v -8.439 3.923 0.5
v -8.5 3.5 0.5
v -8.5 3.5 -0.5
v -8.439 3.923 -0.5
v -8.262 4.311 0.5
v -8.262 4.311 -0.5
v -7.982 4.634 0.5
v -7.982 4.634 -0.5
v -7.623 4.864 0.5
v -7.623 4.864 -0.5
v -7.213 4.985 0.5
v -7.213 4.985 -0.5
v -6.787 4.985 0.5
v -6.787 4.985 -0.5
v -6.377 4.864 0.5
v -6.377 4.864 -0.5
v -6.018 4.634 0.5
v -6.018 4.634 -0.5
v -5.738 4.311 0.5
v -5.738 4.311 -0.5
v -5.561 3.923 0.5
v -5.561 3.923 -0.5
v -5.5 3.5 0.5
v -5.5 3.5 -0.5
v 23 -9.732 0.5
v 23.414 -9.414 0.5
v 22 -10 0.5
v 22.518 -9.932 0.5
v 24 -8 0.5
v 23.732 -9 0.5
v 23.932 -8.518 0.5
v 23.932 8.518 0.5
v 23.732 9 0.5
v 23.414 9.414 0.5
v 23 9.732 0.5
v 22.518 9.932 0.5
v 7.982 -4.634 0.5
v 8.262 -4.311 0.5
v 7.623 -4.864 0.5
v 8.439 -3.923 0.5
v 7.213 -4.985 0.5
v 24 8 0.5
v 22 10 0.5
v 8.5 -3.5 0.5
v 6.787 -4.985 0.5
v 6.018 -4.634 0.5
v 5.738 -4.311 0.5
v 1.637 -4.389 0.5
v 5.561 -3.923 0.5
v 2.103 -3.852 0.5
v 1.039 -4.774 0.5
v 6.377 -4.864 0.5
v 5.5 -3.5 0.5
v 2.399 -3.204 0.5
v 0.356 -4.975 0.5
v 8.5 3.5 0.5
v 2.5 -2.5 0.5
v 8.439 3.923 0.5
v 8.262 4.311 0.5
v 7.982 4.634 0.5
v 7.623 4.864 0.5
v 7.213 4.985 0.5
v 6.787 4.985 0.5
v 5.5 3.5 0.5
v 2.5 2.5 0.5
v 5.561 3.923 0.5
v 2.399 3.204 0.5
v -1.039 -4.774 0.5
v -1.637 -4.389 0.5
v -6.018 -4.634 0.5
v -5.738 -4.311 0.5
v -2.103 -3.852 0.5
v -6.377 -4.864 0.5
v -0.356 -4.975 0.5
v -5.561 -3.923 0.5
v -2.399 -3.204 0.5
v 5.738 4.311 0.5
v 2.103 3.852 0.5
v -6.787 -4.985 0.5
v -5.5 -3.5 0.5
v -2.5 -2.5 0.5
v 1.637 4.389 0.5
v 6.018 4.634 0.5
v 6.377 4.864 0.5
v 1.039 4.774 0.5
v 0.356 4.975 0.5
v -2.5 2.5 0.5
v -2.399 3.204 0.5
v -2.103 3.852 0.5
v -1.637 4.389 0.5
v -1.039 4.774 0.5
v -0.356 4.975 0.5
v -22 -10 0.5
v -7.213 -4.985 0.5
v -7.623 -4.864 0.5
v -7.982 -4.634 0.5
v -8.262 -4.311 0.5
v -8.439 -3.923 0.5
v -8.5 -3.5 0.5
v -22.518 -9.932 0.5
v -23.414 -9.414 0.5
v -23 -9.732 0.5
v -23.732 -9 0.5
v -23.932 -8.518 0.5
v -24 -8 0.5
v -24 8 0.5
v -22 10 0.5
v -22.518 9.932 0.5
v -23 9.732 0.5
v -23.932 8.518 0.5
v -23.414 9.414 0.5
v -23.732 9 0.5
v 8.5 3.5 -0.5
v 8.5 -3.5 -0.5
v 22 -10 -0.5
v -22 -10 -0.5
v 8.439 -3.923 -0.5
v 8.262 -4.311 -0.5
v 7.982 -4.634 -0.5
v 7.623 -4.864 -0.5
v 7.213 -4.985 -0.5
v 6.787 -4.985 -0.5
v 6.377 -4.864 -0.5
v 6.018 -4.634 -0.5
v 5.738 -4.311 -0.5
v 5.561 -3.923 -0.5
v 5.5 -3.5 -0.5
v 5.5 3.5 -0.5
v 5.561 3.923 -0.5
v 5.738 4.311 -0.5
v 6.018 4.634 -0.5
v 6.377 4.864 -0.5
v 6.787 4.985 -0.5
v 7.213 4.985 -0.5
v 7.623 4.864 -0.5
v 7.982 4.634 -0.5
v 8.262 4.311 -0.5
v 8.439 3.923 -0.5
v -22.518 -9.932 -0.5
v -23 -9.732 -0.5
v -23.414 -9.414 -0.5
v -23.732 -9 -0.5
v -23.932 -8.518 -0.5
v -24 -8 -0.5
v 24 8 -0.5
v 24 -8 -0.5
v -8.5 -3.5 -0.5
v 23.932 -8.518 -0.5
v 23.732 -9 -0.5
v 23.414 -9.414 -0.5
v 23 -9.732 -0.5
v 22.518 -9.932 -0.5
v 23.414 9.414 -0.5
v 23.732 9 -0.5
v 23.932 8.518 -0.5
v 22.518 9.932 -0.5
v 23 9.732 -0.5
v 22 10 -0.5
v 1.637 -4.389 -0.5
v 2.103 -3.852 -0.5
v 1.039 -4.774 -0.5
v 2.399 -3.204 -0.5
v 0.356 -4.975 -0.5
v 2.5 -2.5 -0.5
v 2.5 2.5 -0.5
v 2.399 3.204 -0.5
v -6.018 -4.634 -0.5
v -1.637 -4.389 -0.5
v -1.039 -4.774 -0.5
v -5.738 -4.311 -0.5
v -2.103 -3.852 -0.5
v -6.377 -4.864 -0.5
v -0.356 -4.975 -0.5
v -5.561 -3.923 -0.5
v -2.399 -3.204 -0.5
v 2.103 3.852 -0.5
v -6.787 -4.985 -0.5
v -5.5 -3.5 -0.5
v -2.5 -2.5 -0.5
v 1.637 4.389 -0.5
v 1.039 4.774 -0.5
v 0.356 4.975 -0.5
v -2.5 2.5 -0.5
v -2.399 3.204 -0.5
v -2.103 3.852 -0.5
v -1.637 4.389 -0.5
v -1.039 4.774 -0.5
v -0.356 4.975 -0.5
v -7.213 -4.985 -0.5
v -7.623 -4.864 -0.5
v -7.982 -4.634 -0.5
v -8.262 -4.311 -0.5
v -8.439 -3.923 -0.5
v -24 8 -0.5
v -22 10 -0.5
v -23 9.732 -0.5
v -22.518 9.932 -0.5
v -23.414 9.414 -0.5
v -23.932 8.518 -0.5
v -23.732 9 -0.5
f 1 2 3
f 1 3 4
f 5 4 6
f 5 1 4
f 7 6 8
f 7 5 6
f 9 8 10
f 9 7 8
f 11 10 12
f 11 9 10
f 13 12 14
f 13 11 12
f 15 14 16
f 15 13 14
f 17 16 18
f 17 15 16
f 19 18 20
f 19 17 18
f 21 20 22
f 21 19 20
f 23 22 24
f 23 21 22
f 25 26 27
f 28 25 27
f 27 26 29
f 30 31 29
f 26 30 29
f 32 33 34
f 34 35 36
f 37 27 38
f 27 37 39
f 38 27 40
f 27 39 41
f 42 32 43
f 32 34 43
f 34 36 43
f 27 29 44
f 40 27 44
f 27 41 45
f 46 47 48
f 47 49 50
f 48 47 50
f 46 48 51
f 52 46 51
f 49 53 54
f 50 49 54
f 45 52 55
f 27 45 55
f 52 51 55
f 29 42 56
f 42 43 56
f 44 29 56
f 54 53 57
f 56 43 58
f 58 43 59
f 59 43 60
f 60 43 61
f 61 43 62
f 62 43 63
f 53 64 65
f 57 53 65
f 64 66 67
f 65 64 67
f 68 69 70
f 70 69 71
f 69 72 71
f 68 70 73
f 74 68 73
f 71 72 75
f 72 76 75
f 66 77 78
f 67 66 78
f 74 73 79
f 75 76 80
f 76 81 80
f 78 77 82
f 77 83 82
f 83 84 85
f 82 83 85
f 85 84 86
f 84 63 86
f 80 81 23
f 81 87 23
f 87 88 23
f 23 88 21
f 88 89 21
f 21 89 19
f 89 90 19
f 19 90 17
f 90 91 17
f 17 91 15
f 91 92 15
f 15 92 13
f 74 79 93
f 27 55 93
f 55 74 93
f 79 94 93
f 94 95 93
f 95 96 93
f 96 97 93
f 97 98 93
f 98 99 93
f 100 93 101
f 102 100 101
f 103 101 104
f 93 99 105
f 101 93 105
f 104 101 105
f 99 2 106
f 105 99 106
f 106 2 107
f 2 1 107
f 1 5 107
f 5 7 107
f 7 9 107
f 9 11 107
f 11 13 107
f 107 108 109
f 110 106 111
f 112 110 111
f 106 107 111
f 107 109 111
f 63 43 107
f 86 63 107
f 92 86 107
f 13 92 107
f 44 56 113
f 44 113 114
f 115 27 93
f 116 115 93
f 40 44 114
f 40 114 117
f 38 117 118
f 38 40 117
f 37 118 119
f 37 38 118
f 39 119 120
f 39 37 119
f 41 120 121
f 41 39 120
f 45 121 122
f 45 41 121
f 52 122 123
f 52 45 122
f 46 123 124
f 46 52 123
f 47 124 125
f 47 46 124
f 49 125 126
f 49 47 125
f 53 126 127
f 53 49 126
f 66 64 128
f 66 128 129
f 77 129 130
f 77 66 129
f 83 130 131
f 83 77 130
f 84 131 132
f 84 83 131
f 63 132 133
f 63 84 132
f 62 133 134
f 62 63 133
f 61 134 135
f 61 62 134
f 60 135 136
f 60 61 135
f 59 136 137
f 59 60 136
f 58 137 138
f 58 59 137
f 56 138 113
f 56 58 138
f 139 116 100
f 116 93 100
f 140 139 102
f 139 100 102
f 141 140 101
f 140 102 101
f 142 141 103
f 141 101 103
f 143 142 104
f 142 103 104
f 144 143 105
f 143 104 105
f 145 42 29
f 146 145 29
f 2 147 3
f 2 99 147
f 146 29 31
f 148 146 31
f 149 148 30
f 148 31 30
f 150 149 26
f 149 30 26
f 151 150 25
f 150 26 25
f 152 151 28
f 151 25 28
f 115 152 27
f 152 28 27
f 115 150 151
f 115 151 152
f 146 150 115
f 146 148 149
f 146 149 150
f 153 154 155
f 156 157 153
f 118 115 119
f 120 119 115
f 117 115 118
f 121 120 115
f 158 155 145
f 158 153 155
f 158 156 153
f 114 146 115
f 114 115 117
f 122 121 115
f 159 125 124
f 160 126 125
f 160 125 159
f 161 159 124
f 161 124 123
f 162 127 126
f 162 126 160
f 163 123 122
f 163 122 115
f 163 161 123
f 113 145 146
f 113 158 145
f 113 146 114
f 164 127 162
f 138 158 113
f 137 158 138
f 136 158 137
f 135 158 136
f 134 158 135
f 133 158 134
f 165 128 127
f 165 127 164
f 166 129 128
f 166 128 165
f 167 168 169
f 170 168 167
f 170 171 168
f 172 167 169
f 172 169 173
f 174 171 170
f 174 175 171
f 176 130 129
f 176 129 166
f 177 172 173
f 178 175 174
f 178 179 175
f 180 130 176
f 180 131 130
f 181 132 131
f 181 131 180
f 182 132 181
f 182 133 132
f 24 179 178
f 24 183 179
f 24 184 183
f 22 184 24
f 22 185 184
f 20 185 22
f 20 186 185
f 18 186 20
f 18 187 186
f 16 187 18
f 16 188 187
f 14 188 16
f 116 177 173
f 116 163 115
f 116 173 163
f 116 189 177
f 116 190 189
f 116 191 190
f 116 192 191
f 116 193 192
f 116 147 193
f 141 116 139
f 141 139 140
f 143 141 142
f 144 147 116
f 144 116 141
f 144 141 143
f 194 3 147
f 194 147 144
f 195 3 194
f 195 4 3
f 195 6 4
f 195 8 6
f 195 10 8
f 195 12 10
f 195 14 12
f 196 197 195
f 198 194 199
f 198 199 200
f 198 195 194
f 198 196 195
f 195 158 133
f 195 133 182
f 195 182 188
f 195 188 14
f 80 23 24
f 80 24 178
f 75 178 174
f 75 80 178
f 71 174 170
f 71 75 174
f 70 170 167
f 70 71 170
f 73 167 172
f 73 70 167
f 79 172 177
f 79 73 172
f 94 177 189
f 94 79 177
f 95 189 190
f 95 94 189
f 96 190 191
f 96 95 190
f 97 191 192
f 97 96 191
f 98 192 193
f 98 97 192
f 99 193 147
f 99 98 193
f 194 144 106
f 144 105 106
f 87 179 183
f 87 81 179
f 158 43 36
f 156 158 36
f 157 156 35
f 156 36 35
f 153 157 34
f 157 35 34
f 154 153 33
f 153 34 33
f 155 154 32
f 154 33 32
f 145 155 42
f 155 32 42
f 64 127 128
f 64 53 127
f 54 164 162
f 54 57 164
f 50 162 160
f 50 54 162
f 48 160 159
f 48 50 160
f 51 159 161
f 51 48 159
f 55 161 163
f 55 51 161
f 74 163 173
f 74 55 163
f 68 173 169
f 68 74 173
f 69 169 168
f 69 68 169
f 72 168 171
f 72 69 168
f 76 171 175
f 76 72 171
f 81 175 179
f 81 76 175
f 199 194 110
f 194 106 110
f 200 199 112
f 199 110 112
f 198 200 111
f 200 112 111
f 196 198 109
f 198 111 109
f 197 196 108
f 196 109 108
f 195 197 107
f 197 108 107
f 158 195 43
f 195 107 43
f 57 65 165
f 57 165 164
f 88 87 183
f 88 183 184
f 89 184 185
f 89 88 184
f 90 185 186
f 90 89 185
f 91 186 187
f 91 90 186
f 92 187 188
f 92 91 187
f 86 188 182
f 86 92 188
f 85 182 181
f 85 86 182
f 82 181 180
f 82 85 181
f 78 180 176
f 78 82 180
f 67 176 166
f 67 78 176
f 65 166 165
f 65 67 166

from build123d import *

# Parameters (mm, degrees)
BOSS_EXTRUDE1_DEPTH = 0.5


with BuildPart() as part:
    # Sketch1 → Boss-Extrude1 (new, symmetric)
    with BuildSketch(Plane.XY):
        with BuildLine():
            Line((22, -10), (-22, -10))
            ThreePointArc((-22, -10), (-23.414213562, -9.414213562), (-24, -8))
            Line((-24, -8), (-24, 8))
            ThreePointArc((-24, 8), (-23.414213562, 9.414213562), (-22, 10))
            Line((-22, 10), (22, 10))
            ThreePointArc((22, 10), (23.414213562, 9.414213562), (24, 8))
            Line((24, 8), (24, -8))
            ThreePointArc((24, -8), (23.414213562, -9.414213562), (22, -10))
        make_face()
        with BuildLine():
            Line((-2.5, -2.5), (-2.5, 2.5))
            ThreePointArc((-2.5, 2.5), (0, 5), (2.5, 2.5))
            Line((2.5, 2.5), (2.5, -2.5))
            ThreePointArc((2.5, -2.5), (0, -5), (-2.5, -2.5))
        make_face(mode=Mode.SUBTRACT)
        with BuildLine():
            Line((-8.5, -3.5), (-8.5, 3.5))
            ThreePointArc((-8.5, 3.5), (-7, 5), (-5.5, 3.5))
            Line((-5.5, 3.5), (-5.5, -3.5))
            ThreePointArc((-5.5, -3.5), (-7, -5), (-8.5, -3.5))
        make_face(mode=Mode.SUBTRACT)
        with BuildLine():
            Line((5.5, -3.5), (5.5, 3.5))
            ThreePointArc((5.5, 3.5), (7, 5), (8.5, 3.5))
            Line((8.5, 3.5), (8.5, -3.5))
            ThreePointArc((8.5, -3.5), (7, -5), (5.5, -3.5))
        make_face(mode=Mode.SUBTRACT)
    extrude(amount=BOSS_EXTRUDE1_DEPTH, both=True)


solid = part.part
